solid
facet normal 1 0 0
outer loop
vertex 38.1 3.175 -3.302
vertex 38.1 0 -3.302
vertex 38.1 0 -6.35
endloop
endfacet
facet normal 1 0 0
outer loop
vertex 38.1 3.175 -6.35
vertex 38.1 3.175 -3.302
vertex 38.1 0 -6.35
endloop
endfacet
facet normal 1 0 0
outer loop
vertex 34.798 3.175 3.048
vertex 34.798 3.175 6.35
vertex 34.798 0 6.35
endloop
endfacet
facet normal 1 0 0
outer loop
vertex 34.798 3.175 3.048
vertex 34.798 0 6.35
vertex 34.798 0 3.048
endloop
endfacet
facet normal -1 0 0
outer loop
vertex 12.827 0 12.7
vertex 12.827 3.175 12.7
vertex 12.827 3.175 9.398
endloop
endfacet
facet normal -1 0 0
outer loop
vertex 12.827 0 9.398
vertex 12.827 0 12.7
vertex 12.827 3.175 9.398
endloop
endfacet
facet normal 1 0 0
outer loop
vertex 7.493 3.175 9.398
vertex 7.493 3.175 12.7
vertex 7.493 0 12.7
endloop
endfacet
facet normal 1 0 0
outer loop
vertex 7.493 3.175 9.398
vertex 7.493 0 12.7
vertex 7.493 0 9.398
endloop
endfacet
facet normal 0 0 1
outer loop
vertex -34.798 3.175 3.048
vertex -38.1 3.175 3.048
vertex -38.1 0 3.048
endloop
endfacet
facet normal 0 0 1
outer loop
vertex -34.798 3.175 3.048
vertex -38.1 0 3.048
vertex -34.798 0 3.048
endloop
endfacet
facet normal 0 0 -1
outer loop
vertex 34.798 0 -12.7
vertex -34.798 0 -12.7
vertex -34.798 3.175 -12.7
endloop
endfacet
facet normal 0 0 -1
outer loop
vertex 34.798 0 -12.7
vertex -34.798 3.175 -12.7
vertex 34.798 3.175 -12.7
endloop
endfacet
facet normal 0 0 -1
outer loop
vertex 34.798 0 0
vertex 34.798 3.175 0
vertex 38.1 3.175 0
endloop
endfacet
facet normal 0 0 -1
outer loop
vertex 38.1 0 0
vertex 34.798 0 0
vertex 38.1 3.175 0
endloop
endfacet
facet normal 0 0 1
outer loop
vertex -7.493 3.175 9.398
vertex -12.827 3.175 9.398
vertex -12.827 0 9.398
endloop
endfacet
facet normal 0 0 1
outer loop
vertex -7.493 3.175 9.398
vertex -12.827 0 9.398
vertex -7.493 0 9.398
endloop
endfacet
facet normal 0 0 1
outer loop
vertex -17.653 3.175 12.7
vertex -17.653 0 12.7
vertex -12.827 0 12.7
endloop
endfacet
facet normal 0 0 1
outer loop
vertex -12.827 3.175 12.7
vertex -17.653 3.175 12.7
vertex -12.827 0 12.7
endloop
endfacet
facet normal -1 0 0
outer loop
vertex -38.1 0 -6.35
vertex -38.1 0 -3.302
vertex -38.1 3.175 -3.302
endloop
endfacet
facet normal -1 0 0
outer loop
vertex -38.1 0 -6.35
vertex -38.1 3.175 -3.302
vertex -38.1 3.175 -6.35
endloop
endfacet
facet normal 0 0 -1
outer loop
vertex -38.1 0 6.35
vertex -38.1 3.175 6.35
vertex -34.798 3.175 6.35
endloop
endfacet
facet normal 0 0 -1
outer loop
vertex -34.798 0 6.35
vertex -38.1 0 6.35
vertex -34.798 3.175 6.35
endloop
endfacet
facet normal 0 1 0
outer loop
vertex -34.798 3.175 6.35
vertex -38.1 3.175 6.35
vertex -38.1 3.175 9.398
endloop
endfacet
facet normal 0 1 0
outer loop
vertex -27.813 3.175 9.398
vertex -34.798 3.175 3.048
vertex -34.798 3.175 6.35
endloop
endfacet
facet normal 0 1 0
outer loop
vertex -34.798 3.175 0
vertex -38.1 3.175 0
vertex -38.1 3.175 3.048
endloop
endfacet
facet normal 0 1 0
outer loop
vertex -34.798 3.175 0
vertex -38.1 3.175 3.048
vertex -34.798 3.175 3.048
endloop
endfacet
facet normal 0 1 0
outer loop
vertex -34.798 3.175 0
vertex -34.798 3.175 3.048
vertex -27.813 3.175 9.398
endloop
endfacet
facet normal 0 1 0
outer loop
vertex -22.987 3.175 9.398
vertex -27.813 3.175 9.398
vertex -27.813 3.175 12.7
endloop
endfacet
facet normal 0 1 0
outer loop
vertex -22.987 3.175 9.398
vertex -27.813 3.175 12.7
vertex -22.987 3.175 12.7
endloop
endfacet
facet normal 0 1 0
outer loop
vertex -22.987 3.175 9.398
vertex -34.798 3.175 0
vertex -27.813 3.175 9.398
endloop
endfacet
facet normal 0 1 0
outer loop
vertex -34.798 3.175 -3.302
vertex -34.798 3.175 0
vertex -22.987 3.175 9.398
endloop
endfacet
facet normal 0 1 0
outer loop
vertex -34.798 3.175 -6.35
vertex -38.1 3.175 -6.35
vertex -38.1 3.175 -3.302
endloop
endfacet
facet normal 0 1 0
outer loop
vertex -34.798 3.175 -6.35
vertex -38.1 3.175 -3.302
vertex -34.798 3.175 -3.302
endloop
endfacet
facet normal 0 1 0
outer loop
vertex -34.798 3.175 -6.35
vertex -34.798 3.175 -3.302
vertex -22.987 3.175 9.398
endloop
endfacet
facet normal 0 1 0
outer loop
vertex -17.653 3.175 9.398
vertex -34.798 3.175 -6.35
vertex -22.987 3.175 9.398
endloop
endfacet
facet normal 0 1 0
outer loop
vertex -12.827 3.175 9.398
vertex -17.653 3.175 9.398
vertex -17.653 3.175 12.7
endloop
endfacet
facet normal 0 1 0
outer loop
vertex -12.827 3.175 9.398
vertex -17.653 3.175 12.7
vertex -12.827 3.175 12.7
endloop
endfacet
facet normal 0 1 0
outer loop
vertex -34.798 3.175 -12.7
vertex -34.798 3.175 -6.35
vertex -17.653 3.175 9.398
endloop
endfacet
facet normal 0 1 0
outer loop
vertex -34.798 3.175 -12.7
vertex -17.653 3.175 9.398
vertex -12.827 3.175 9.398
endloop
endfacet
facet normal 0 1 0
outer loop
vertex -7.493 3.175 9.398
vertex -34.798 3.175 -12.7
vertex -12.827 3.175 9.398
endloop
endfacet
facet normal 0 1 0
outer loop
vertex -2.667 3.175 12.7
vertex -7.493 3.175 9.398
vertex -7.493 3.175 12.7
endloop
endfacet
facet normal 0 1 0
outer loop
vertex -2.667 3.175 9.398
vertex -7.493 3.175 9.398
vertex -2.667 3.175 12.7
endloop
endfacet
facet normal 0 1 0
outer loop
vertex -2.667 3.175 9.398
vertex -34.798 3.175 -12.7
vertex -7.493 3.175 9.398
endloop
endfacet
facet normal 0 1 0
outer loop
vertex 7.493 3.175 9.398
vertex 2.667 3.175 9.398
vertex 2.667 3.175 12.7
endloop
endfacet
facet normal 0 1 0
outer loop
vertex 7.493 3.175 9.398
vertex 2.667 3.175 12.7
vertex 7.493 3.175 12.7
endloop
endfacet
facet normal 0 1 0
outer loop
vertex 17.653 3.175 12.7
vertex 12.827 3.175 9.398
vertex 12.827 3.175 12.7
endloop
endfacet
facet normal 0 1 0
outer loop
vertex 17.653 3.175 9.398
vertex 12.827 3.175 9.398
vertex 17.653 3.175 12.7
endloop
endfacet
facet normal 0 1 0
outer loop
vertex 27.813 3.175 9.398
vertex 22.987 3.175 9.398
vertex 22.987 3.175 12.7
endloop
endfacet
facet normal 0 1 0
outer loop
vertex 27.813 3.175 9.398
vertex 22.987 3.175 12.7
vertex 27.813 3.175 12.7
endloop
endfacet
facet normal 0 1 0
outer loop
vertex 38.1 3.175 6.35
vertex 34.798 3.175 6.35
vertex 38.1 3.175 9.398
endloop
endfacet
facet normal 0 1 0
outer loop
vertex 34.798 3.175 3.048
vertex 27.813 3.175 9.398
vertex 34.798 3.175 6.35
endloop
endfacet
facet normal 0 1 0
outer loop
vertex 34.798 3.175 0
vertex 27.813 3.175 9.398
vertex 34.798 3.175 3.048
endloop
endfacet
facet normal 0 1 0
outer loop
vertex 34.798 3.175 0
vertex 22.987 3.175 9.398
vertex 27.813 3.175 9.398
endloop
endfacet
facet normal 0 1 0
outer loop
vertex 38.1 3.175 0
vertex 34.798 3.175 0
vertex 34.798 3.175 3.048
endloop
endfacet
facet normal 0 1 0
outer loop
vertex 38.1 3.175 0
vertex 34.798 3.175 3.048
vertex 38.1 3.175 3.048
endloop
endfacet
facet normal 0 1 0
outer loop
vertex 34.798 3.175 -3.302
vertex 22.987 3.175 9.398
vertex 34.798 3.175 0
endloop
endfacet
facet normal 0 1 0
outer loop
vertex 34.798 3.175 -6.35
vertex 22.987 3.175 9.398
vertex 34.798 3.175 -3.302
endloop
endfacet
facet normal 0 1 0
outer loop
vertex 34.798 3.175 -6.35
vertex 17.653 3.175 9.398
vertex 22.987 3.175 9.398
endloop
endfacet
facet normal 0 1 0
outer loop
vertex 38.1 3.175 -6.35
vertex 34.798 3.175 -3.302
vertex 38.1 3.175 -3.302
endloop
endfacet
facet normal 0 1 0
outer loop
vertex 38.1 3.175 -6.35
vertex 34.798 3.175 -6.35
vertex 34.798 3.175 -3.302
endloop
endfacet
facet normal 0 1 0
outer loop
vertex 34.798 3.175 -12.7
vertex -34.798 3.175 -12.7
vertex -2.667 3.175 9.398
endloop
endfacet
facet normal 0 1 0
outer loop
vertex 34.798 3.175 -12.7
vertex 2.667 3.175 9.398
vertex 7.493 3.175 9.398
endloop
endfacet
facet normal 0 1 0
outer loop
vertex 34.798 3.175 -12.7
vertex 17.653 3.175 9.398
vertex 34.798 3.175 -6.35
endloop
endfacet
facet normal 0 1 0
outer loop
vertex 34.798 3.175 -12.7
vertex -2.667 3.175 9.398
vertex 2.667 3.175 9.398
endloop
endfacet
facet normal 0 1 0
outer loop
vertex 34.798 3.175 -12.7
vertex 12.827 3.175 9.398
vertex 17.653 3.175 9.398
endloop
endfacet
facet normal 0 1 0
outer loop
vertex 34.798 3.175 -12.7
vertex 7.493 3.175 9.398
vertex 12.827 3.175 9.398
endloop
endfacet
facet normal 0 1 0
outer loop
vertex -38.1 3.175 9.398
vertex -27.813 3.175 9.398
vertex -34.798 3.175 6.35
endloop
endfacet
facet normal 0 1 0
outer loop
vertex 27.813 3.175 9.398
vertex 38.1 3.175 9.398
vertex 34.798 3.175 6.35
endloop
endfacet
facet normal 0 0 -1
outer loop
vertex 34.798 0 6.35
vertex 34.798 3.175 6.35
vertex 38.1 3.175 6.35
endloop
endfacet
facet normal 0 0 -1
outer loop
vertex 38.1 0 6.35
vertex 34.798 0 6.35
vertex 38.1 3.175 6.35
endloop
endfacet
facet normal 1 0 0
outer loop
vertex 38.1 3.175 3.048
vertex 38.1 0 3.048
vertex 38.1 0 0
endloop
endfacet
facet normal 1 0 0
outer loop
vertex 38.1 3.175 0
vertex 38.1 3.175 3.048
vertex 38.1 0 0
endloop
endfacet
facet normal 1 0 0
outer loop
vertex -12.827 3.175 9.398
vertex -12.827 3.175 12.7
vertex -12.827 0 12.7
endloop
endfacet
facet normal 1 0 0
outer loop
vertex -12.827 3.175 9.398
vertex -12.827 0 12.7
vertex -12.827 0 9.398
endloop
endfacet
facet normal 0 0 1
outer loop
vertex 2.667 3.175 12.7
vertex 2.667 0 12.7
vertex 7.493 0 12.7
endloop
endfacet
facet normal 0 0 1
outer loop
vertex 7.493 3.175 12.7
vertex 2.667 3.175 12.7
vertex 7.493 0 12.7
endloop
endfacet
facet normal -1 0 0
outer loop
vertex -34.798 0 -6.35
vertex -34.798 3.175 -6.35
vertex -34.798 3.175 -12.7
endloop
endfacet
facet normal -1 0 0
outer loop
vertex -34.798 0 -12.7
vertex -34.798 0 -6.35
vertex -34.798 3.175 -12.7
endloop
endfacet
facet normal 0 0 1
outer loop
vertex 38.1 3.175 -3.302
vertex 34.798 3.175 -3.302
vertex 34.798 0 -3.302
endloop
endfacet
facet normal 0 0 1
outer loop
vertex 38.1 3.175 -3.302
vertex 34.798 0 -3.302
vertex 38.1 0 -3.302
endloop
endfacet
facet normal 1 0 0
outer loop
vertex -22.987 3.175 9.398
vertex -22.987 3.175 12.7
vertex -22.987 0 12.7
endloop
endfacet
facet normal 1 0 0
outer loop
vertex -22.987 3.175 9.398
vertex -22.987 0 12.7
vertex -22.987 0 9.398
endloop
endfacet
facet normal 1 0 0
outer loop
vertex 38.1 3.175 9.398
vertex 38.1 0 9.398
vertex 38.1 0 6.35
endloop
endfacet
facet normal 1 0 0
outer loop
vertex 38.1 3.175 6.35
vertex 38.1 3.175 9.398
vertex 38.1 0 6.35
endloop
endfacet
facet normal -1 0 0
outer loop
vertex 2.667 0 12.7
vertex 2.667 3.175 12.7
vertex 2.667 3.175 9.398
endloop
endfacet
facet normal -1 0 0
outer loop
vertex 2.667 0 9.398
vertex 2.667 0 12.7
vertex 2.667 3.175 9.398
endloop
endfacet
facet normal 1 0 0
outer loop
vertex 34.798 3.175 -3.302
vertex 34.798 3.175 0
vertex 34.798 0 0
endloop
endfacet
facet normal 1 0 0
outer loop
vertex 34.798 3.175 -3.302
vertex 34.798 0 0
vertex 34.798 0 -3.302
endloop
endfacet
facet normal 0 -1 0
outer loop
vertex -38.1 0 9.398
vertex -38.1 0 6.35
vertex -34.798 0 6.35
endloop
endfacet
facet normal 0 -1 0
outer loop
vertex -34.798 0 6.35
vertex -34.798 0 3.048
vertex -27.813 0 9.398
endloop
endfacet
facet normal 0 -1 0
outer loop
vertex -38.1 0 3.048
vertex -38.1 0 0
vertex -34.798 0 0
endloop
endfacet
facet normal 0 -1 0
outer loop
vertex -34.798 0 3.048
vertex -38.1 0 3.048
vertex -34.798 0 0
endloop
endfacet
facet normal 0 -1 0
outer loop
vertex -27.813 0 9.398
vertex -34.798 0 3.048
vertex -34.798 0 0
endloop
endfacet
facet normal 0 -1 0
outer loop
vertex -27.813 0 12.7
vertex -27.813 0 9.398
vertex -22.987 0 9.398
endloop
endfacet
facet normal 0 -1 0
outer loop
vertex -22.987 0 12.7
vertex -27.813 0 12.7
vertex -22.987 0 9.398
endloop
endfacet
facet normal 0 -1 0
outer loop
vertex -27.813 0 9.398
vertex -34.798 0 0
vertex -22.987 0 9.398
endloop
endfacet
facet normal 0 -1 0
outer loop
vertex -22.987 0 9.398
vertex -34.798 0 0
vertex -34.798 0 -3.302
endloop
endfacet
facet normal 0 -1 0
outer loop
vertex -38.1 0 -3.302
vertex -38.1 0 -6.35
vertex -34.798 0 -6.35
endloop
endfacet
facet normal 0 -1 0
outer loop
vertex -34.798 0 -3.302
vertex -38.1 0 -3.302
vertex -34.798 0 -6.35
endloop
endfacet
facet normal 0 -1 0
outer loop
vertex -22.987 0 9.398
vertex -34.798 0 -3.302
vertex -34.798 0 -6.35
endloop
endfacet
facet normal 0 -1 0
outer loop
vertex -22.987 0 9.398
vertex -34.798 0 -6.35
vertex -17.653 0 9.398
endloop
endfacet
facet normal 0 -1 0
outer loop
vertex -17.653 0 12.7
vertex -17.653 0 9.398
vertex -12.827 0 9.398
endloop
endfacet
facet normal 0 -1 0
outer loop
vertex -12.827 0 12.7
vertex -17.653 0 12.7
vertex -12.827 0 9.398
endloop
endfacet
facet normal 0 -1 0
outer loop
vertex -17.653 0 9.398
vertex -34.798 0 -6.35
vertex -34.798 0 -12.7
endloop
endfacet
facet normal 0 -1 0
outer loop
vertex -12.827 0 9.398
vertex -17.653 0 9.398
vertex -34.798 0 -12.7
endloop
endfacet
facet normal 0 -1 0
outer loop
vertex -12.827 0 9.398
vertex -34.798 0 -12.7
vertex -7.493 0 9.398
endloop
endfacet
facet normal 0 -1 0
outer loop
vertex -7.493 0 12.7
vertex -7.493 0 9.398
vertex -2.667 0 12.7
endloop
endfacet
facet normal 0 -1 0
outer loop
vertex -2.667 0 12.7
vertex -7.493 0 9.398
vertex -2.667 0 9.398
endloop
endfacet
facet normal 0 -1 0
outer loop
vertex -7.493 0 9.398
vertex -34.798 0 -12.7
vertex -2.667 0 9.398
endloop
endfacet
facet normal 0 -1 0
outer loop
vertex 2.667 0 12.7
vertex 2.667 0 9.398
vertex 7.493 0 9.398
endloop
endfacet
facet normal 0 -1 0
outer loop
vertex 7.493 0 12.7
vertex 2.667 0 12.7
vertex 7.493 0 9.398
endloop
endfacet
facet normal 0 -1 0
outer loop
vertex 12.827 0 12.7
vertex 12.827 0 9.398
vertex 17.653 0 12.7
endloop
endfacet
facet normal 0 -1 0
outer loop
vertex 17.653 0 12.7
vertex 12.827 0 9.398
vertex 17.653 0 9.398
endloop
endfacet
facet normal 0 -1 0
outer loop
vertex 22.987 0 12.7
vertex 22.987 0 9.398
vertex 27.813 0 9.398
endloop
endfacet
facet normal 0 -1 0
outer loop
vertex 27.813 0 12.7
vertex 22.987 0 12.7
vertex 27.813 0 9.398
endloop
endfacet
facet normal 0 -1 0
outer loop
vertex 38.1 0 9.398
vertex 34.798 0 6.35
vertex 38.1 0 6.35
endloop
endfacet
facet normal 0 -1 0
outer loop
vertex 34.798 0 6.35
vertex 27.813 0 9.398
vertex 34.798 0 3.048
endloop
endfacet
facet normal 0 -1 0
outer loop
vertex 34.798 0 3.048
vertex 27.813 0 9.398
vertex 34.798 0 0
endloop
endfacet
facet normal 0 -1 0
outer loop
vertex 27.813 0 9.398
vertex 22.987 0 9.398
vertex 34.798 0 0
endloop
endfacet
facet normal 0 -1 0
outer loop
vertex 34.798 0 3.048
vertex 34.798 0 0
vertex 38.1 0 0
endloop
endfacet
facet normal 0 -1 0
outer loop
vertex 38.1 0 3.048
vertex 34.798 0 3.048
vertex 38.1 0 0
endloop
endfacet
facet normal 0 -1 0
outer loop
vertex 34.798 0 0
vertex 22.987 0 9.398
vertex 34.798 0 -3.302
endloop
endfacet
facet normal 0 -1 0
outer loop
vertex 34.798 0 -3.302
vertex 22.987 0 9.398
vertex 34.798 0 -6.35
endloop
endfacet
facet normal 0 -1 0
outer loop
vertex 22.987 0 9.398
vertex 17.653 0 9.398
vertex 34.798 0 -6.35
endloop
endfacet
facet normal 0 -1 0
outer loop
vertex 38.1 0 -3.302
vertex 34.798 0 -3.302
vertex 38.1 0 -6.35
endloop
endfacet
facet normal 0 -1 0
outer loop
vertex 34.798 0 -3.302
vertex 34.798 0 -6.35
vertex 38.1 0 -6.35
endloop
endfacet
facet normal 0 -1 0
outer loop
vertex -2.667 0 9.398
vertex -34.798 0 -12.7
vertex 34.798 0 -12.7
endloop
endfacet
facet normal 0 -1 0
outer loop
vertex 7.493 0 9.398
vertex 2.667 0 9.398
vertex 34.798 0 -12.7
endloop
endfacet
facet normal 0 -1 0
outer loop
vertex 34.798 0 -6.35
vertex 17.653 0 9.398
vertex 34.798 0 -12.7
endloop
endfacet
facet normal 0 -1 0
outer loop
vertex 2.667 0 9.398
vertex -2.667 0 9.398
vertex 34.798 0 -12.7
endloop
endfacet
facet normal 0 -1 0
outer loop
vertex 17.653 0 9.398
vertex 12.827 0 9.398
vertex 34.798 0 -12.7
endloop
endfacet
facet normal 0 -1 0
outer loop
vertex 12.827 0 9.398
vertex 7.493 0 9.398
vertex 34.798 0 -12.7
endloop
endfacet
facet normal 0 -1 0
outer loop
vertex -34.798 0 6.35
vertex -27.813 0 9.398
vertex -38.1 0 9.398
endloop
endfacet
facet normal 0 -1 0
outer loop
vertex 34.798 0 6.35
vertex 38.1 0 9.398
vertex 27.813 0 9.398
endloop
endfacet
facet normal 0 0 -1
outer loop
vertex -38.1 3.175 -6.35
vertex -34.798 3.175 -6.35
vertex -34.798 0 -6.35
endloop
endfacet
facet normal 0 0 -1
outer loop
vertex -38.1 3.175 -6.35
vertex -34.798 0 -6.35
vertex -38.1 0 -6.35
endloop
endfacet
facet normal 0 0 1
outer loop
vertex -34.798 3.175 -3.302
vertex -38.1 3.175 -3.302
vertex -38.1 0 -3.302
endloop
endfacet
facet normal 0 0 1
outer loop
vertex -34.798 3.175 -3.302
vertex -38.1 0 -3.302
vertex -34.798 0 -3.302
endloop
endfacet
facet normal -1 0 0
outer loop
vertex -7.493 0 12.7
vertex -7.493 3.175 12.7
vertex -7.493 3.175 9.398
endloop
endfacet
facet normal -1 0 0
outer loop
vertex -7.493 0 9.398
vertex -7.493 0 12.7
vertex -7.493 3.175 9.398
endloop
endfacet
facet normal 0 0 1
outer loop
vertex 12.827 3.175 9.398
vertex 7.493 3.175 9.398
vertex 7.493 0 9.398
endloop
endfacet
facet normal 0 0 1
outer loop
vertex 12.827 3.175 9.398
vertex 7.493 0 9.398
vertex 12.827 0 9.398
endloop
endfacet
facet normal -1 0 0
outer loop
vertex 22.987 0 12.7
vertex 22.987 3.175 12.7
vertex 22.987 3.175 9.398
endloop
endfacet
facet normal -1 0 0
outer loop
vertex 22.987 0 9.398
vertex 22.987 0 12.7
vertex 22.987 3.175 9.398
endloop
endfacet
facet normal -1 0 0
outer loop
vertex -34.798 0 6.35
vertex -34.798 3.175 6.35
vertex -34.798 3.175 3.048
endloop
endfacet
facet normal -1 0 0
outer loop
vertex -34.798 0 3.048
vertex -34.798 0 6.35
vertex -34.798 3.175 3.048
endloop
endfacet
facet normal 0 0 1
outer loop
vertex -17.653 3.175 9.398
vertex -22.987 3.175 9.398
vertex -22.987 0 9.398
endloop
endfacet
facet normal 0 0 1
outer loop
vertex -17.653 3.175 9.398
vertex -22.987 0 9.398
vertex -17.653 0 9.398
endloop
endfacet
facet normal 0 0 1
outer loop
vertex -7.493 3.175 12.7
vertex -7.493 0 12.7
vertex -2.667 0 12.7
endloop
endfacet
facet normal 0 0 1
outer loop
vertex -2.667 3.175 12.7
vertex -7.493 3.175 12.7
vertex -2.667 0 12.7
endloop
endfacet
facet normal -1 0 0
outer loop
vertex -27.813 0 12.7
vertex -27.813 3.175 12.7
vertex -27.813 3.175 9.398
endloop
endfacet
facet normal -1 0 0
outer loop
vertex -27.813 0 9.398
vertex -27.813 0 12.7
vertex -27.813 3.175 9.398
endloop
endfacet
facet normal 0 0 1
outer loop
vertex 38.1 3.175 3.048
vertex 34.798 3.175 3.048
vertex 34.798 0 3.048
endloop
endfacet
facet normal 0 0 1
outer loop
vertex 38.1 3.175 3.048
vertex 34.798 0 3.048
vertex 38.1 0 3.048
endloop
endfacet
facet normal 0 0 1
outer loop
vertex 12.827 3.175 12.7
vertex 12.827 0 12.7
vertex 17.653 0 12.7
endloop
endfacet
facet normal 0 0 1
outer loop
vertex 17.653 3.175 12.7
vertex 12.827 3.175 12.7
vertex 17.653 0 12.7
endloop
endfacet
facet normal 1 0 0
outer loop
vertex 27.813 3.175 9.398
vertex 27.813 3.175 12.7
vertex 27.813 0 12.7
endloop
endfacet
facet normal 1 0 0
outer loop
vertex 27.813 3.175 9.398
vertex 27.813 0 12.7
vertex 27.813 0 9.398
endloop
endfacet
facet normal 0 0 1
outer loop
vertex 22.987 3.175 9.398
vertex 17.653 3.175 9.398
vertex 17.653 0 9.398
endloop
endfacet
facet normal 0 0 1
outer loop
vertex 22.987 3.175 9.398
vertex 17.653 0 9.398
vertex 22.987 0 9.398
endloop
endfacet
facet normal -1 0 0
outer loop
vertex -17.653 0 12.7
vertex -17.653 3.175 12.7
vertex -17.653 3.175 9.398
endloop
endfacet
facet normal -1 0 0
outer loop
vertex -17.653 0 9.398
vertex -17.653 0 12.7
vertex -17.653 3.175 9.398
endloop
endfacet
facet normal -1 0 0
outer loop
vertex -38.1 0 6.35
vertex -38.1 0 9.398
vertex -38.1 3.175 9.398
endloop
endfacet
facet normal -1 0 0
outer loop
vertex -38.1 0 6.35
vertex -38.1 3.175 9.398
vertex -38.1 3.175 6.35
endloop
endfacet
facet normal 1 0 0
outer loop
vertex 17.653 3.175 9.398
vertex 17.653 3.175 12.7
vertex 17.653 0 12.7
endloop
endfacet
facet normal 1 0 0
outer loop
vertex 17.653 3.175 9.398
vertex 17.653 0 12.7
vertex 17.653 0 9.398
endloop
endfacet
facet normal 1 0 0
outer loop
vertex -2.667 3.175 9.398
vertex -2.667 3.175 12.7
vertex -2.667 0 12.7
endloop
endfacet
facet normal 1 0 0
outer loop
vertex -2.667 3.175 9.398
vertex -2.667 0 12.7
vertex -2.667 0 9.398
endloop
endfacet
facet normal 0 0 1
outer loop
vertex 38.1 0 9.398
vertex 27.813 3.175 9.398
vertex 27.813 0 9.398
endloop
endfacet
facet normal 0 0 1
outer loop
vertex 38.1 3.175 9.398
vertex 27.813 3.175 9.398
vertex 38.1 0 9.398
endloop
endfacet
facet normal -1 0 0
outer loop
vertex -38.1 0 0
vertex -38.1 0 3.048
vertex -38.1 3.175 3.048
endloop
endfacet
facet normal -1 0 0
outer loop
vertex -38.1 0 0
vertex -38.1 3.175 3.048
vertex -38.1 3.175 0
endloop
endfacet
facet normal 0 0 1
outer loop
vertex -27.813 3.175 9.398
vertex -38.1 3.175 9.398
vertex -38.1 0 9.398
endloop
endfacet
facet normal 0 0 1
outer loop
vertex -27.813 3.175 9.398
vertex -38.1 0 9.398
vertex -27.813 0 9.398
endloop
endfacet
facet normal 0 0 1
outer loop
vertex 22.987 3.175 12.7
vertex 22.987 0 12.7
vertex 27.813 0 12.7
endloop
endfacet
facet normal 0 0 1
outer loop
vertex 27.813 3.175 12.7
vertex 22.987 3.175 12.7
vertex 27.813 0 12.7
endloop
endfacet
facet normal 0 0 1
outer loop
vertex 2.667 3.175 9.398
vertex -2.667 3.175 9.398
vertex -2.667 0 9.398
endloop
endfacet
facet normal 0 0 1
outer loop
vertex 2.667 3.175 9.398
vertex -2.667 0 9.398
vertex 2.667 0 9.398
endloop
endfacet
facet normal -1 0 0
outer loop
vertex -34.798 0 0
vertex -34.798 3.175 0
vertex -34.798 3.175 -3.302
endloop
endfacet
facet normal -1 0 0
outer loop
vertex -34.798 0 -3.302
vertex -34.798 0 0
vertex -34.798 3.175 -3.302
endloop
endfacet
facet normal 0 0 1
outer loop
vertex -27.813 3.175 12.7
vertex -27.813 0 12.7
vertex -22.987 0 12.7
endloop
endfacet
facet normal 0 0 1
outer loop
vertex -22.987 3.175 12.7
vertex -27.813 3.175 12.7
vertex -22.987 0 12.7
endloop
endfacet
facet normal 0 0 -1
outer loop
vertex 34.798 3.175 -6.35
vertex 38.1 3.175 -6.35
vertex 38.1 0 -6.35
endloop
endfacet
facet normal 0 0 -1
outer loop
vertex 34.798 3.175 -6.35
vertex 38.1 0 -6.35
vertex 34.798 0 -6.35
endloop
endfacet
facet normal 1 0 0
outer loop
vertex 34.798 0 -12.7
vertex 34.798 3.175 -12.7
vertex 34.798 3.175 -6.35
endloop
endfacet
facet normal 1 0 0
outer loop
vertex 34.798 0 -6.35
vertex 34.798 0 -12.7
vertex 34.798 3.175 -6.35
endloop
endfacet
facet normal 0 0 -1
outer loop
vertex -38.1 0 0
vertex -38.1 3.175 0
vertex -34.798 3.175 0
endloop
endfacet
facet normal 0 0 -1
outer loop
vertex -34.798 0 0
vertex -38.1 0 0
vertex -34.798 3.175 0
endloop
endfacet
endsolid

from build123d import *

# Parameters (mm, degrees)
SKETCH1_W           = 76.2
SKETCH1_H           = 25.4
BOSS_EXTRUDE1_DEPTH = 3.175
SKETCH3_W           = 10.287
SKETCH3_H           = 3.302
SKETCH3_W_2         = 5.334
SKETCH3_W_3         = 3.302
CUT_EXTRUDE1_DEPTH  = 41.286233691


with BuildPart() as part:
    # Sketch1 → Boss-Extrude1 (new body)
    with BuildSketch(Plane(origin=(0, 0, 0), x_dir=(1, 0, 0), z_dir=(0, 1, 0))):
        Rectangle(SKETCH1_W, SKETCH1_H)
    extrude(amount=BOSS_EXTRUDE1_DEPTH)

    # Sketch3 → Cut-Extrude1 (cut, through all)
    with BuildSketch(Plane(origin=(0, 3.175, 0), x_dir=(1, 0, 0), z_dir=(0, 1, 0))):
        with Locations((32.9565, -11.049)):
            Rectangle(SKETCH3_W, SKETCH3_H)
        with Locations((20.32, -11.049)):
            Rectangle(SKETCH3_W_2, SKETCH3_H)
        with Locations((10.16, -11.049)):
            Rectangle(SKETCH3_W_2, SKETCH3_H)
        with Locations((0, -11.049)):
            Rectangle(SKETCH3_W_2, SKETCH3_H)
        with Locations((-10.16, -11.049)):
            Rectangle(SKETCH3_W_2, SKETCH3_H)
        with Locations((-20.32, -11.049)):
            Rectangle(SKETCH3_W_2, SKETCH3_H)
        with Locations((-32.9565, -11.049)):
            Rectangle(SKETCH3_W, SKETCH3_H)
        with Locations((36.449, -4.699)):
            Rectangle(SKETCH3_W_3, SKETCH3_H)
        with Locations((36.449, 1.651)):
            Rectangle(SKETCH3_W_3, SKETCH3_H)
        Polygon((38.1, 6.35), (34.798, 6.35), (34.798, 9.652), (34.798, 12.7), (38.1, 12.7), (38.1, 9.652), align=None)
        Polygon((-34.798, 12.7), (-34.798, 9.652), (-34.798, 6.35), (-38.1, 6.35), (-38.1, 9.652), (-38.1, 12.7), align=None)
        with Locations((-36.449, 1.651)):
            Rectangle(SKETCH3_W_3, SKETCH3_H)
        with Locations((-36.449, -4.699)):
            Rectangle(SKETCH3_W_3, SKETCH3_H)
    extrude(amount=-CUT_EXTRUDE1_DEPTH, mode=Mode.SUBTRACT)


solid = part.part
